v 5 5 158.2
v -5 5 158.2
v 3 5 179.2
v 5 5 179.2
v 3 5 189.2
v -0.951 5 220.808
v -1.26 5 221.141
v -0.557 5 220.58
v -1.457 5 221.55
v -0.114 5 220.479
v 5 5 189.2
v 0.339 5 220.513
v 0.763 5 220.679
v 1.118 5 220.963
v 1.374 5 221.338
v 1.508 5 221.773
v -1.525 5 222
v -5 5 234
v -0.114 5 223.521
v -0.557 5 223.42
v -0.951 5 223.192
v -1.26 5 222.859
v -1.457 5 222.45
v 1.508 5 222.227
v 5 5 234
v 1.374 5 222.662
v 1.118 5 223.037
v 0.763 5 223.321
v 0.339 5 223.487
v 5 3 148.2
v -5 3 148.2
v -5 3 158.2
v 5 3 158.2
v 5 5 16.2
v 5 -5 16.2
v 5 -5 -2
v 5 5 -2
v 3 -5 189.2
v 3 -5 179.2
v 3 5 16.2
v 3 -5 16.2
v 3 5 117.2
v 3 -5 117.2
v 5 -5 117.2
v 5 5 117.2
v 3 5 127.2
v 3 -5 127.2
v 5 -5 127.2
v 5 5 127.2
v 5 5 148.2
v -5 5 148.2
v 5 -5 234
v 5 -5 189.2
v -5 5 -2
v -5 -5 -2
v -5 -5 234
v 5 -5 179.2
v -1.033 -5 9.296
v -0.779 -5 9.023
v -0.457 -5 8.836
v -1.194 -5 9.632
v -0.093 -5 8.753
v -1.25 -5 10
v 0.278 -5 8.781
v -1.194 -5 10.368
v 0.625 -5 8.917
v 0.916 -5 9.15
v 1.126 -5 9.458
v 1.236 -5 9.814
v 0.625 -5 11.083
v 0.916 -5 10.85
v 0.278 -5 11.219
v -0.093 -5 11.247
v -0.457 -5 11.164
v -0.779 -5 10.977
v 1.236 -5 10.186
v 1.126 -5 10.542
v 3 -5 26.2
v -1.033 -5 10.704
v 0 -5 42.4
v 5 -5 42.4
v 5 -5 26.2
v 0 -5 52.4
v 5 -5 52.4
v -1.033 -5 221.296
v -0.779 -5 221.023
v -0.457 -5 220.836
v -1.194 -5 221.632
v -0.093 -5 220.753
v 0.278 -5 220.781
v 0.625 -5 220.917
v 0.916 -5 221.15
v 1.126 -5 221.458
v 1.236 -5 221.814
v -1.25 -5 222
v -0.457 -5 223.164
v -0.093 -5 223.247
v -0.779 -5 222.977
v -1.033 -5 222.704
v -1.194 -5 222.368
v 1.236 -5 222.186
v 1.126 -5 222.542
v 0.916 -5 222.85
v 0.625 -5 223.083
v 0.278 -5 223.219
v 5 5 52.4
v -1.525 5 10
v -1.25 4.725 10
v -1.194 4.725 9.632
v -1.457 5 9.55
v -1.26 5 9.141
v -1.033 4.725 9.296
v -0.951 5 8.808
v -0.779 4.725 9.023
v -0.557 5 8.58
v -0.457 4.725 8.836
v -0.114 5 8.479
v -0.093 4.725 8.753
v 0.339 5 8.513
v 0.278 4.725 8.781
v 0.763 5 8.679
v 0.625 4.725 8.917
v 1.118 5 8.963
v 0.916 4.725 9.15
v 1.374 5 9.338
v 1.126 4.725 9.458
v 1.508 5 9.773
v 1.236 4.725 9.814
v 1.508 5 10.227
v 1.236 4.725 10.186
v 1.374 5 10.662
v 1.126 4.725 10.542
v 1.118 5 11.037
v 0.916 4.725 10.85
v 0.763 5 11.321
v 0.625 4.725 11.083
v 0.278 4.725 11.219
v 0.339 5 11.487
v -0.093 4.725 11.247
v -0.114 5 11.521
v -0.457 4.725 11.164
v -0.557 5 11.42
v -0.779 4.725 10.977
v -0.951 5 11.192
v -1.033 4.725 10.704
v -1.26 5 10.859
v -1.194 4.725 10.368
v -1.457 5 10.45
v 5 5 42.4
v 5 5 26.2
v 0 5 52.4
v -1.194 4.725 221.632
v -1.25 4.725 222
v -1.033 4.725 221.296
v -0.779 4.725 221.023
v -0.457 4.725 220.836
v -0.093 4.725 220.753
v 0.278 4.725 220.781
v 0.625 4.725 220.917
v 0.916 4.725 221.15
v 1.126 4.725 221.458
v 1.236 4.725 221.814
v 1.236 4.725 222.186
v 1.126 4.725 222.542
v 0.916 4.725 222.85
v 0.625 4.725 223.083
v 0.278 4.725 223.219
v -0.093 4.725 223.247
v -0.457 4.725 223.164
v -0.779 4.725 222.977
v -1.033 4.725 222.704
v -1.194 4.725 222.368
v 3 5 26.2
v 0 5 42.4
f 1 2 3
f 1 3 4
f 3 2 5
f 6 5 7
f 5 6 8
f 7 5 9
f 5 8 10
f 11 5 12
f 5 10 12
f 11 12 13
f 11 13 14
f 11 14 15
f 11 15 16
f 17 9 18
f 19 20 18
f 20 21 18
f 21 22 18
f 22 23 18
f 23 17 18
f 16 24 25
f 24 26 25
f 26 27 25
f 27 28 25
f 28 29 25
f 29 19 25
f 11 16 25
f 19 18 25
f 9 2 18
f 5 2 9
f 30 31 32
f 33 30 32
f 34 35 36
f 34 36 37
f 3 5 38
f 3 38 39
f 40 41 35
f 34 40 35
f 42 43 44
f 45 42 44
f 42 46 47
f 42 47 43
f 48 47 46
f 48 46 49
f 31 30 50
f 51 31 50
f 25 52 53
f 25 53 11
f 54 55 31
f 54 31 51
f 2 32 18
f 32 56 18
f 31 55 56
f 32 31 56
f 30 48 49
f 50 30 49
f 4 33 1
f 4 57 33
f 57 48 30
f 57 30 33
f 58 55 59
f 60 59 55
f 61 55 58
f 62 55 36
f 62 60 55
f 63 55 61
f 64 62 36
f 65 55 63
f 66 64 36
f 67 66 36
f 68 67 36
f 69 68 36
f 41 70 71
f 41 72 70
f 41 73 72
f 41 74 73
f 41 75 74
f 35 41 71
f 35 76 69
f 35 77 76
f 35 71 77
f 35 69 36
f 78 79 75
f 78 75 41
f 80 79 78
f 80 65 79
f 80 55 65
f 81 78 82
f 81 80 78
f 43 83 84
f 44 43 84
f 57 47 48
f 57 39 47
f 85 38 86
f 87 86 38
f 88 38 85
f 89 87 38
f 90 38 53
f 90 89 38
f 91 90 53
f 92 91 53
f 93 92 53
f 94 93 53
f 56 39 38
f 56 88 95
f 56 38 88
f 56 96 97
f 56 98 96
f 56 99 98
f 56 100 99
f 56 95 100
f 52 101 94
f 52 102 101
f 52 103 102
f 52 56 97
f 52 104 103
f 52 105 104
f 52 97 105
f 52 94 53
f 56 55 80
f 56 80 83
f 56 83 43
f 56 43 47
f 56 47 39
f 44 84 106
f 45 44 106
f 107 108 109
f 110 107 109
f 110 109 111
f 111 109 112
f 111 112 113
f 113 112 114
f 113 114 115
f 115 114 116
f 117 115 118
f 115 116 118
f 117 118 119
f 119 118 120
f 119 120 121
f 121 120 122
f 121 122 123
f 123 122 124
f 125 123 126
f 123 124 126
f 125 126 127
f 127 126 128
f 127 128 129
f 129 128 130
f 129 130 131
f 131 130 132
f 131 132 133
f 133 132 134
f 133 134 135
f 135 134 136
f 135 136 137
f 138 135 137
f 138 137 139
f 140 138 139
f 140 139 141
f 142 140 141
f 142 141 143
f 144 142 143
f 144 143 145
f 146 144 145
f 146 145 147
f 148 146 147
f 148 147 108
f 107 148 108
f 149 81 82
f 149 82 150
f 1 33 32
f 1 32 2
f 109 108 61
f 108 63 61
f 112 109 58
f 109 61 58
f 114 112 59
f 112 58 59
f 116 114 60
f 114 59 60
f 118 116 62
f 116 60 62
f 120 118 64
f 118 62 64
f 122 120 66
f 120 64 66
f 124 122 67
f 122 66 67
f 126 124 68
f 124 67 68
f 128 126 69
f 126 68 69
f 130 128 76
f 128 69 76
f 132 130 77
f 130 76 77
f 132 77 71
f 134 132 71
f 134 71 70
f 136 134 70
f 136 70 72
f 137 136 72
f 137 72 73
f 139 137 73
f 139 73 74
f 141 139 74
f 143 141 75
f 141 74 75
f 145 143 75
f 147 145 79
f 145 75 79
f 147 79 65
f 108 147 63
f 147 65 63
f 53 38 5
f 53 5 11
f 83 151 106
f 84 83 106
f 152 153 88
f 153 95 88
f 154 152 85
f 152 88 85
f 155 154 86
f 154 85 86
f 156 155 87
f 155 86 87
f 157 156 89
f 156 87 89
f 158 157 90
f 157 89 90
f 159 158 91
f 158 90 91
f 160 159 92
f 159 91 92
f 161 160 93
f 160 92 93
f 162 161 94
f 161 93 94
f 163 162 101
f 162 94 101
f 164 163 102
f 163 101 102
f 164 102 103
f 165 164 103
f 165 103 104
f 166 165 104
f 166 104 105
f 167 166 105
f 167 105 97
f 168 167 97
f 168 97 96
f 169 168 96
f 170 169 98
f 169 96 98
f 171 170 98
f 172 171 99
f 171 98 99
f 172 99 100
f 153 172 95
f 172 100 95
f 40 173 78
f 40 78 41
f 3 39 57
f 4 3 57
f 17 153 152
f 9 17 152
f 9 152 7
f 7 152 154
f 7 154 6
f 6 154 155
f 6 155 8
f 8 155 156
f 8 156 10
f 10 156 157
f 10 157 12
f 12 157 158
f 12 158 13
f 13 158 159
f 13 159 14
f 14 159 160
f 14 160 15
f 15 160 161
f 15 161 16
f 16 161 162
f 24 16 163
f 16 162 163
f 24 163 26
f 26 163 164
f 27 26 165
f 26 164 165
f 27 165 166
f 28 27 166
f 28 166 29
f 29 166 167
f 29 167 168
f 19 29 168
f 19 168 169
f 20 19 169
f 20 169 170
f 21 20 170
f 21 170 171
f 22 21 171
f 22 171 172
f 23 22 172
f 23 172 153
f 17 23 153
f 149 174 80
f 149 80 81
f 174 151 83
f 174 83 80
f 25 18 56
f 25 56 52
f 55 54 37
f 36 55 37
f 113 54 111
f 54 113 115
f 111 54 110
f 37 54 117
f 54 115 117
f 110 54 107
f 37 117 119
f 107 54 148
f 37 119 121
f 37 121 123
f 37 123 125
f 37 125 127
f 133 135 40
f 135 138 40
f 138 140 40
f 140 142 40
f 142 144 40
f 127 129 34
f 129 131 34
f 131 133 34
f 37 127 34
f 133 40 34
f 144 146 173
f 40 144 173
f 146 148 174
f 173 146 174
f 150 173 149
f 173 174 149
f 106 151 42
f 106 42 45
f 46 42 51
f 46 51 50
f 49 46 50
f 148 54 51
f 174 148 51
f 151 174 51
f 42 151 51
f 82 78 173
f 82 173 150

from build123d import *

# Parameters (mm, degrees)
ESQUISSE1_W                     = 10
ESQUISSE1_H                     = 10
BOSS_EXTRU_1_DEPTH              = 234
BOSS_EXTRU_1_DEPTH_BACK         = 2
ESQUISSE2_W                     = 2
ESQUISSE2_H                     = 10
ESQUISSE2_W_2                   = 5
ENL_V_MAT_EXTRU_1_DEPTH         = 11
ESQUISSE3_W                     = 10
ESQUISSE3_H                     = 2
ENL_V_MAT_EXTRU_2_DEPTH         = 11
TROU_TARAUD_M3X0_51_D           = 2.5
TROU_TARAUD_M3X0_51_CSINK_D     = 3.05
TROU_TARAUD_M3X0_51_CSINK_ANGLE = 90


with BuildPart() as part:
    # Esquisse1 → Boss.-Extru.1 (new body, two sides)
    with BuildSketch(Plane.XY) as boss_extru_1_sk:
        Rectangle(ESQUISSE1_W, ESQUISSE1_H)
    extrude(amount=BOSS_EXTRU_1_DEPTH)
    extrude(boss_extru_1_sk.sketch, amount=-BOSS_EXTRU_1_DEPTH_BACK)

    # Esquisse2 → Enl_v. mat.-Extru.1 (cut, through all)
    with BuildSketch(Plane(origin=(0, 5, 0), x_dir=(1, 0, 0), z_dir=(0, 1, 0))):
        with Locations((4, -122.2)):
            Rectangle(ESQUISSE2_W, ESQUISSE2_H)
        with Locations((4, -184.2)):
            Rectangle(ESQUISSE2_W, ESQUISSE2_H)
        with Locations((4, -21.2)):
            Rectangle(ESQUISSE2_W, ESQUISSE2_H)
        with Locations((2.5, -47.4)):
            Rectangle(ESQUISSE2_W_2, ESQUISSE2_H)
    extrude(amount=-ENL_V_MAT_EXTRU_1_DEPTH, mode=Mode.SUBTRACT)

    # Esquisse3 → Enl_v. mat.-Extru.2 (cut, through all)
    with BuildSketch(Plane.ZY.offset(5)):
        with Locations((153.2, 4)):
            Rectangle(ESQUISSE3_W, ESQUISSE3_H)
    extrude(amount=-ENL_V_MAT_EXTRU_2_DEPTH, mode=Mode.SUBTRACT)

    # Trou taraud_ M3x0.51 (through all)
    with Locations(Plane(origin=(0, 5, 0), x_dir=(1, 0, 0), z_dir=(0, 1, 0))):
        with Locations((0, -222), (0, -10)):
            CounterSinkHole(TROU_TARAUD_M3X0_51_D / 2, TROU_TARAUD_M3X0_51_CSINK_D / 2, counter_sink_angle=TROU_TARAUD_M3X0_51_CSINK_ANGLE)


solid = part.part
